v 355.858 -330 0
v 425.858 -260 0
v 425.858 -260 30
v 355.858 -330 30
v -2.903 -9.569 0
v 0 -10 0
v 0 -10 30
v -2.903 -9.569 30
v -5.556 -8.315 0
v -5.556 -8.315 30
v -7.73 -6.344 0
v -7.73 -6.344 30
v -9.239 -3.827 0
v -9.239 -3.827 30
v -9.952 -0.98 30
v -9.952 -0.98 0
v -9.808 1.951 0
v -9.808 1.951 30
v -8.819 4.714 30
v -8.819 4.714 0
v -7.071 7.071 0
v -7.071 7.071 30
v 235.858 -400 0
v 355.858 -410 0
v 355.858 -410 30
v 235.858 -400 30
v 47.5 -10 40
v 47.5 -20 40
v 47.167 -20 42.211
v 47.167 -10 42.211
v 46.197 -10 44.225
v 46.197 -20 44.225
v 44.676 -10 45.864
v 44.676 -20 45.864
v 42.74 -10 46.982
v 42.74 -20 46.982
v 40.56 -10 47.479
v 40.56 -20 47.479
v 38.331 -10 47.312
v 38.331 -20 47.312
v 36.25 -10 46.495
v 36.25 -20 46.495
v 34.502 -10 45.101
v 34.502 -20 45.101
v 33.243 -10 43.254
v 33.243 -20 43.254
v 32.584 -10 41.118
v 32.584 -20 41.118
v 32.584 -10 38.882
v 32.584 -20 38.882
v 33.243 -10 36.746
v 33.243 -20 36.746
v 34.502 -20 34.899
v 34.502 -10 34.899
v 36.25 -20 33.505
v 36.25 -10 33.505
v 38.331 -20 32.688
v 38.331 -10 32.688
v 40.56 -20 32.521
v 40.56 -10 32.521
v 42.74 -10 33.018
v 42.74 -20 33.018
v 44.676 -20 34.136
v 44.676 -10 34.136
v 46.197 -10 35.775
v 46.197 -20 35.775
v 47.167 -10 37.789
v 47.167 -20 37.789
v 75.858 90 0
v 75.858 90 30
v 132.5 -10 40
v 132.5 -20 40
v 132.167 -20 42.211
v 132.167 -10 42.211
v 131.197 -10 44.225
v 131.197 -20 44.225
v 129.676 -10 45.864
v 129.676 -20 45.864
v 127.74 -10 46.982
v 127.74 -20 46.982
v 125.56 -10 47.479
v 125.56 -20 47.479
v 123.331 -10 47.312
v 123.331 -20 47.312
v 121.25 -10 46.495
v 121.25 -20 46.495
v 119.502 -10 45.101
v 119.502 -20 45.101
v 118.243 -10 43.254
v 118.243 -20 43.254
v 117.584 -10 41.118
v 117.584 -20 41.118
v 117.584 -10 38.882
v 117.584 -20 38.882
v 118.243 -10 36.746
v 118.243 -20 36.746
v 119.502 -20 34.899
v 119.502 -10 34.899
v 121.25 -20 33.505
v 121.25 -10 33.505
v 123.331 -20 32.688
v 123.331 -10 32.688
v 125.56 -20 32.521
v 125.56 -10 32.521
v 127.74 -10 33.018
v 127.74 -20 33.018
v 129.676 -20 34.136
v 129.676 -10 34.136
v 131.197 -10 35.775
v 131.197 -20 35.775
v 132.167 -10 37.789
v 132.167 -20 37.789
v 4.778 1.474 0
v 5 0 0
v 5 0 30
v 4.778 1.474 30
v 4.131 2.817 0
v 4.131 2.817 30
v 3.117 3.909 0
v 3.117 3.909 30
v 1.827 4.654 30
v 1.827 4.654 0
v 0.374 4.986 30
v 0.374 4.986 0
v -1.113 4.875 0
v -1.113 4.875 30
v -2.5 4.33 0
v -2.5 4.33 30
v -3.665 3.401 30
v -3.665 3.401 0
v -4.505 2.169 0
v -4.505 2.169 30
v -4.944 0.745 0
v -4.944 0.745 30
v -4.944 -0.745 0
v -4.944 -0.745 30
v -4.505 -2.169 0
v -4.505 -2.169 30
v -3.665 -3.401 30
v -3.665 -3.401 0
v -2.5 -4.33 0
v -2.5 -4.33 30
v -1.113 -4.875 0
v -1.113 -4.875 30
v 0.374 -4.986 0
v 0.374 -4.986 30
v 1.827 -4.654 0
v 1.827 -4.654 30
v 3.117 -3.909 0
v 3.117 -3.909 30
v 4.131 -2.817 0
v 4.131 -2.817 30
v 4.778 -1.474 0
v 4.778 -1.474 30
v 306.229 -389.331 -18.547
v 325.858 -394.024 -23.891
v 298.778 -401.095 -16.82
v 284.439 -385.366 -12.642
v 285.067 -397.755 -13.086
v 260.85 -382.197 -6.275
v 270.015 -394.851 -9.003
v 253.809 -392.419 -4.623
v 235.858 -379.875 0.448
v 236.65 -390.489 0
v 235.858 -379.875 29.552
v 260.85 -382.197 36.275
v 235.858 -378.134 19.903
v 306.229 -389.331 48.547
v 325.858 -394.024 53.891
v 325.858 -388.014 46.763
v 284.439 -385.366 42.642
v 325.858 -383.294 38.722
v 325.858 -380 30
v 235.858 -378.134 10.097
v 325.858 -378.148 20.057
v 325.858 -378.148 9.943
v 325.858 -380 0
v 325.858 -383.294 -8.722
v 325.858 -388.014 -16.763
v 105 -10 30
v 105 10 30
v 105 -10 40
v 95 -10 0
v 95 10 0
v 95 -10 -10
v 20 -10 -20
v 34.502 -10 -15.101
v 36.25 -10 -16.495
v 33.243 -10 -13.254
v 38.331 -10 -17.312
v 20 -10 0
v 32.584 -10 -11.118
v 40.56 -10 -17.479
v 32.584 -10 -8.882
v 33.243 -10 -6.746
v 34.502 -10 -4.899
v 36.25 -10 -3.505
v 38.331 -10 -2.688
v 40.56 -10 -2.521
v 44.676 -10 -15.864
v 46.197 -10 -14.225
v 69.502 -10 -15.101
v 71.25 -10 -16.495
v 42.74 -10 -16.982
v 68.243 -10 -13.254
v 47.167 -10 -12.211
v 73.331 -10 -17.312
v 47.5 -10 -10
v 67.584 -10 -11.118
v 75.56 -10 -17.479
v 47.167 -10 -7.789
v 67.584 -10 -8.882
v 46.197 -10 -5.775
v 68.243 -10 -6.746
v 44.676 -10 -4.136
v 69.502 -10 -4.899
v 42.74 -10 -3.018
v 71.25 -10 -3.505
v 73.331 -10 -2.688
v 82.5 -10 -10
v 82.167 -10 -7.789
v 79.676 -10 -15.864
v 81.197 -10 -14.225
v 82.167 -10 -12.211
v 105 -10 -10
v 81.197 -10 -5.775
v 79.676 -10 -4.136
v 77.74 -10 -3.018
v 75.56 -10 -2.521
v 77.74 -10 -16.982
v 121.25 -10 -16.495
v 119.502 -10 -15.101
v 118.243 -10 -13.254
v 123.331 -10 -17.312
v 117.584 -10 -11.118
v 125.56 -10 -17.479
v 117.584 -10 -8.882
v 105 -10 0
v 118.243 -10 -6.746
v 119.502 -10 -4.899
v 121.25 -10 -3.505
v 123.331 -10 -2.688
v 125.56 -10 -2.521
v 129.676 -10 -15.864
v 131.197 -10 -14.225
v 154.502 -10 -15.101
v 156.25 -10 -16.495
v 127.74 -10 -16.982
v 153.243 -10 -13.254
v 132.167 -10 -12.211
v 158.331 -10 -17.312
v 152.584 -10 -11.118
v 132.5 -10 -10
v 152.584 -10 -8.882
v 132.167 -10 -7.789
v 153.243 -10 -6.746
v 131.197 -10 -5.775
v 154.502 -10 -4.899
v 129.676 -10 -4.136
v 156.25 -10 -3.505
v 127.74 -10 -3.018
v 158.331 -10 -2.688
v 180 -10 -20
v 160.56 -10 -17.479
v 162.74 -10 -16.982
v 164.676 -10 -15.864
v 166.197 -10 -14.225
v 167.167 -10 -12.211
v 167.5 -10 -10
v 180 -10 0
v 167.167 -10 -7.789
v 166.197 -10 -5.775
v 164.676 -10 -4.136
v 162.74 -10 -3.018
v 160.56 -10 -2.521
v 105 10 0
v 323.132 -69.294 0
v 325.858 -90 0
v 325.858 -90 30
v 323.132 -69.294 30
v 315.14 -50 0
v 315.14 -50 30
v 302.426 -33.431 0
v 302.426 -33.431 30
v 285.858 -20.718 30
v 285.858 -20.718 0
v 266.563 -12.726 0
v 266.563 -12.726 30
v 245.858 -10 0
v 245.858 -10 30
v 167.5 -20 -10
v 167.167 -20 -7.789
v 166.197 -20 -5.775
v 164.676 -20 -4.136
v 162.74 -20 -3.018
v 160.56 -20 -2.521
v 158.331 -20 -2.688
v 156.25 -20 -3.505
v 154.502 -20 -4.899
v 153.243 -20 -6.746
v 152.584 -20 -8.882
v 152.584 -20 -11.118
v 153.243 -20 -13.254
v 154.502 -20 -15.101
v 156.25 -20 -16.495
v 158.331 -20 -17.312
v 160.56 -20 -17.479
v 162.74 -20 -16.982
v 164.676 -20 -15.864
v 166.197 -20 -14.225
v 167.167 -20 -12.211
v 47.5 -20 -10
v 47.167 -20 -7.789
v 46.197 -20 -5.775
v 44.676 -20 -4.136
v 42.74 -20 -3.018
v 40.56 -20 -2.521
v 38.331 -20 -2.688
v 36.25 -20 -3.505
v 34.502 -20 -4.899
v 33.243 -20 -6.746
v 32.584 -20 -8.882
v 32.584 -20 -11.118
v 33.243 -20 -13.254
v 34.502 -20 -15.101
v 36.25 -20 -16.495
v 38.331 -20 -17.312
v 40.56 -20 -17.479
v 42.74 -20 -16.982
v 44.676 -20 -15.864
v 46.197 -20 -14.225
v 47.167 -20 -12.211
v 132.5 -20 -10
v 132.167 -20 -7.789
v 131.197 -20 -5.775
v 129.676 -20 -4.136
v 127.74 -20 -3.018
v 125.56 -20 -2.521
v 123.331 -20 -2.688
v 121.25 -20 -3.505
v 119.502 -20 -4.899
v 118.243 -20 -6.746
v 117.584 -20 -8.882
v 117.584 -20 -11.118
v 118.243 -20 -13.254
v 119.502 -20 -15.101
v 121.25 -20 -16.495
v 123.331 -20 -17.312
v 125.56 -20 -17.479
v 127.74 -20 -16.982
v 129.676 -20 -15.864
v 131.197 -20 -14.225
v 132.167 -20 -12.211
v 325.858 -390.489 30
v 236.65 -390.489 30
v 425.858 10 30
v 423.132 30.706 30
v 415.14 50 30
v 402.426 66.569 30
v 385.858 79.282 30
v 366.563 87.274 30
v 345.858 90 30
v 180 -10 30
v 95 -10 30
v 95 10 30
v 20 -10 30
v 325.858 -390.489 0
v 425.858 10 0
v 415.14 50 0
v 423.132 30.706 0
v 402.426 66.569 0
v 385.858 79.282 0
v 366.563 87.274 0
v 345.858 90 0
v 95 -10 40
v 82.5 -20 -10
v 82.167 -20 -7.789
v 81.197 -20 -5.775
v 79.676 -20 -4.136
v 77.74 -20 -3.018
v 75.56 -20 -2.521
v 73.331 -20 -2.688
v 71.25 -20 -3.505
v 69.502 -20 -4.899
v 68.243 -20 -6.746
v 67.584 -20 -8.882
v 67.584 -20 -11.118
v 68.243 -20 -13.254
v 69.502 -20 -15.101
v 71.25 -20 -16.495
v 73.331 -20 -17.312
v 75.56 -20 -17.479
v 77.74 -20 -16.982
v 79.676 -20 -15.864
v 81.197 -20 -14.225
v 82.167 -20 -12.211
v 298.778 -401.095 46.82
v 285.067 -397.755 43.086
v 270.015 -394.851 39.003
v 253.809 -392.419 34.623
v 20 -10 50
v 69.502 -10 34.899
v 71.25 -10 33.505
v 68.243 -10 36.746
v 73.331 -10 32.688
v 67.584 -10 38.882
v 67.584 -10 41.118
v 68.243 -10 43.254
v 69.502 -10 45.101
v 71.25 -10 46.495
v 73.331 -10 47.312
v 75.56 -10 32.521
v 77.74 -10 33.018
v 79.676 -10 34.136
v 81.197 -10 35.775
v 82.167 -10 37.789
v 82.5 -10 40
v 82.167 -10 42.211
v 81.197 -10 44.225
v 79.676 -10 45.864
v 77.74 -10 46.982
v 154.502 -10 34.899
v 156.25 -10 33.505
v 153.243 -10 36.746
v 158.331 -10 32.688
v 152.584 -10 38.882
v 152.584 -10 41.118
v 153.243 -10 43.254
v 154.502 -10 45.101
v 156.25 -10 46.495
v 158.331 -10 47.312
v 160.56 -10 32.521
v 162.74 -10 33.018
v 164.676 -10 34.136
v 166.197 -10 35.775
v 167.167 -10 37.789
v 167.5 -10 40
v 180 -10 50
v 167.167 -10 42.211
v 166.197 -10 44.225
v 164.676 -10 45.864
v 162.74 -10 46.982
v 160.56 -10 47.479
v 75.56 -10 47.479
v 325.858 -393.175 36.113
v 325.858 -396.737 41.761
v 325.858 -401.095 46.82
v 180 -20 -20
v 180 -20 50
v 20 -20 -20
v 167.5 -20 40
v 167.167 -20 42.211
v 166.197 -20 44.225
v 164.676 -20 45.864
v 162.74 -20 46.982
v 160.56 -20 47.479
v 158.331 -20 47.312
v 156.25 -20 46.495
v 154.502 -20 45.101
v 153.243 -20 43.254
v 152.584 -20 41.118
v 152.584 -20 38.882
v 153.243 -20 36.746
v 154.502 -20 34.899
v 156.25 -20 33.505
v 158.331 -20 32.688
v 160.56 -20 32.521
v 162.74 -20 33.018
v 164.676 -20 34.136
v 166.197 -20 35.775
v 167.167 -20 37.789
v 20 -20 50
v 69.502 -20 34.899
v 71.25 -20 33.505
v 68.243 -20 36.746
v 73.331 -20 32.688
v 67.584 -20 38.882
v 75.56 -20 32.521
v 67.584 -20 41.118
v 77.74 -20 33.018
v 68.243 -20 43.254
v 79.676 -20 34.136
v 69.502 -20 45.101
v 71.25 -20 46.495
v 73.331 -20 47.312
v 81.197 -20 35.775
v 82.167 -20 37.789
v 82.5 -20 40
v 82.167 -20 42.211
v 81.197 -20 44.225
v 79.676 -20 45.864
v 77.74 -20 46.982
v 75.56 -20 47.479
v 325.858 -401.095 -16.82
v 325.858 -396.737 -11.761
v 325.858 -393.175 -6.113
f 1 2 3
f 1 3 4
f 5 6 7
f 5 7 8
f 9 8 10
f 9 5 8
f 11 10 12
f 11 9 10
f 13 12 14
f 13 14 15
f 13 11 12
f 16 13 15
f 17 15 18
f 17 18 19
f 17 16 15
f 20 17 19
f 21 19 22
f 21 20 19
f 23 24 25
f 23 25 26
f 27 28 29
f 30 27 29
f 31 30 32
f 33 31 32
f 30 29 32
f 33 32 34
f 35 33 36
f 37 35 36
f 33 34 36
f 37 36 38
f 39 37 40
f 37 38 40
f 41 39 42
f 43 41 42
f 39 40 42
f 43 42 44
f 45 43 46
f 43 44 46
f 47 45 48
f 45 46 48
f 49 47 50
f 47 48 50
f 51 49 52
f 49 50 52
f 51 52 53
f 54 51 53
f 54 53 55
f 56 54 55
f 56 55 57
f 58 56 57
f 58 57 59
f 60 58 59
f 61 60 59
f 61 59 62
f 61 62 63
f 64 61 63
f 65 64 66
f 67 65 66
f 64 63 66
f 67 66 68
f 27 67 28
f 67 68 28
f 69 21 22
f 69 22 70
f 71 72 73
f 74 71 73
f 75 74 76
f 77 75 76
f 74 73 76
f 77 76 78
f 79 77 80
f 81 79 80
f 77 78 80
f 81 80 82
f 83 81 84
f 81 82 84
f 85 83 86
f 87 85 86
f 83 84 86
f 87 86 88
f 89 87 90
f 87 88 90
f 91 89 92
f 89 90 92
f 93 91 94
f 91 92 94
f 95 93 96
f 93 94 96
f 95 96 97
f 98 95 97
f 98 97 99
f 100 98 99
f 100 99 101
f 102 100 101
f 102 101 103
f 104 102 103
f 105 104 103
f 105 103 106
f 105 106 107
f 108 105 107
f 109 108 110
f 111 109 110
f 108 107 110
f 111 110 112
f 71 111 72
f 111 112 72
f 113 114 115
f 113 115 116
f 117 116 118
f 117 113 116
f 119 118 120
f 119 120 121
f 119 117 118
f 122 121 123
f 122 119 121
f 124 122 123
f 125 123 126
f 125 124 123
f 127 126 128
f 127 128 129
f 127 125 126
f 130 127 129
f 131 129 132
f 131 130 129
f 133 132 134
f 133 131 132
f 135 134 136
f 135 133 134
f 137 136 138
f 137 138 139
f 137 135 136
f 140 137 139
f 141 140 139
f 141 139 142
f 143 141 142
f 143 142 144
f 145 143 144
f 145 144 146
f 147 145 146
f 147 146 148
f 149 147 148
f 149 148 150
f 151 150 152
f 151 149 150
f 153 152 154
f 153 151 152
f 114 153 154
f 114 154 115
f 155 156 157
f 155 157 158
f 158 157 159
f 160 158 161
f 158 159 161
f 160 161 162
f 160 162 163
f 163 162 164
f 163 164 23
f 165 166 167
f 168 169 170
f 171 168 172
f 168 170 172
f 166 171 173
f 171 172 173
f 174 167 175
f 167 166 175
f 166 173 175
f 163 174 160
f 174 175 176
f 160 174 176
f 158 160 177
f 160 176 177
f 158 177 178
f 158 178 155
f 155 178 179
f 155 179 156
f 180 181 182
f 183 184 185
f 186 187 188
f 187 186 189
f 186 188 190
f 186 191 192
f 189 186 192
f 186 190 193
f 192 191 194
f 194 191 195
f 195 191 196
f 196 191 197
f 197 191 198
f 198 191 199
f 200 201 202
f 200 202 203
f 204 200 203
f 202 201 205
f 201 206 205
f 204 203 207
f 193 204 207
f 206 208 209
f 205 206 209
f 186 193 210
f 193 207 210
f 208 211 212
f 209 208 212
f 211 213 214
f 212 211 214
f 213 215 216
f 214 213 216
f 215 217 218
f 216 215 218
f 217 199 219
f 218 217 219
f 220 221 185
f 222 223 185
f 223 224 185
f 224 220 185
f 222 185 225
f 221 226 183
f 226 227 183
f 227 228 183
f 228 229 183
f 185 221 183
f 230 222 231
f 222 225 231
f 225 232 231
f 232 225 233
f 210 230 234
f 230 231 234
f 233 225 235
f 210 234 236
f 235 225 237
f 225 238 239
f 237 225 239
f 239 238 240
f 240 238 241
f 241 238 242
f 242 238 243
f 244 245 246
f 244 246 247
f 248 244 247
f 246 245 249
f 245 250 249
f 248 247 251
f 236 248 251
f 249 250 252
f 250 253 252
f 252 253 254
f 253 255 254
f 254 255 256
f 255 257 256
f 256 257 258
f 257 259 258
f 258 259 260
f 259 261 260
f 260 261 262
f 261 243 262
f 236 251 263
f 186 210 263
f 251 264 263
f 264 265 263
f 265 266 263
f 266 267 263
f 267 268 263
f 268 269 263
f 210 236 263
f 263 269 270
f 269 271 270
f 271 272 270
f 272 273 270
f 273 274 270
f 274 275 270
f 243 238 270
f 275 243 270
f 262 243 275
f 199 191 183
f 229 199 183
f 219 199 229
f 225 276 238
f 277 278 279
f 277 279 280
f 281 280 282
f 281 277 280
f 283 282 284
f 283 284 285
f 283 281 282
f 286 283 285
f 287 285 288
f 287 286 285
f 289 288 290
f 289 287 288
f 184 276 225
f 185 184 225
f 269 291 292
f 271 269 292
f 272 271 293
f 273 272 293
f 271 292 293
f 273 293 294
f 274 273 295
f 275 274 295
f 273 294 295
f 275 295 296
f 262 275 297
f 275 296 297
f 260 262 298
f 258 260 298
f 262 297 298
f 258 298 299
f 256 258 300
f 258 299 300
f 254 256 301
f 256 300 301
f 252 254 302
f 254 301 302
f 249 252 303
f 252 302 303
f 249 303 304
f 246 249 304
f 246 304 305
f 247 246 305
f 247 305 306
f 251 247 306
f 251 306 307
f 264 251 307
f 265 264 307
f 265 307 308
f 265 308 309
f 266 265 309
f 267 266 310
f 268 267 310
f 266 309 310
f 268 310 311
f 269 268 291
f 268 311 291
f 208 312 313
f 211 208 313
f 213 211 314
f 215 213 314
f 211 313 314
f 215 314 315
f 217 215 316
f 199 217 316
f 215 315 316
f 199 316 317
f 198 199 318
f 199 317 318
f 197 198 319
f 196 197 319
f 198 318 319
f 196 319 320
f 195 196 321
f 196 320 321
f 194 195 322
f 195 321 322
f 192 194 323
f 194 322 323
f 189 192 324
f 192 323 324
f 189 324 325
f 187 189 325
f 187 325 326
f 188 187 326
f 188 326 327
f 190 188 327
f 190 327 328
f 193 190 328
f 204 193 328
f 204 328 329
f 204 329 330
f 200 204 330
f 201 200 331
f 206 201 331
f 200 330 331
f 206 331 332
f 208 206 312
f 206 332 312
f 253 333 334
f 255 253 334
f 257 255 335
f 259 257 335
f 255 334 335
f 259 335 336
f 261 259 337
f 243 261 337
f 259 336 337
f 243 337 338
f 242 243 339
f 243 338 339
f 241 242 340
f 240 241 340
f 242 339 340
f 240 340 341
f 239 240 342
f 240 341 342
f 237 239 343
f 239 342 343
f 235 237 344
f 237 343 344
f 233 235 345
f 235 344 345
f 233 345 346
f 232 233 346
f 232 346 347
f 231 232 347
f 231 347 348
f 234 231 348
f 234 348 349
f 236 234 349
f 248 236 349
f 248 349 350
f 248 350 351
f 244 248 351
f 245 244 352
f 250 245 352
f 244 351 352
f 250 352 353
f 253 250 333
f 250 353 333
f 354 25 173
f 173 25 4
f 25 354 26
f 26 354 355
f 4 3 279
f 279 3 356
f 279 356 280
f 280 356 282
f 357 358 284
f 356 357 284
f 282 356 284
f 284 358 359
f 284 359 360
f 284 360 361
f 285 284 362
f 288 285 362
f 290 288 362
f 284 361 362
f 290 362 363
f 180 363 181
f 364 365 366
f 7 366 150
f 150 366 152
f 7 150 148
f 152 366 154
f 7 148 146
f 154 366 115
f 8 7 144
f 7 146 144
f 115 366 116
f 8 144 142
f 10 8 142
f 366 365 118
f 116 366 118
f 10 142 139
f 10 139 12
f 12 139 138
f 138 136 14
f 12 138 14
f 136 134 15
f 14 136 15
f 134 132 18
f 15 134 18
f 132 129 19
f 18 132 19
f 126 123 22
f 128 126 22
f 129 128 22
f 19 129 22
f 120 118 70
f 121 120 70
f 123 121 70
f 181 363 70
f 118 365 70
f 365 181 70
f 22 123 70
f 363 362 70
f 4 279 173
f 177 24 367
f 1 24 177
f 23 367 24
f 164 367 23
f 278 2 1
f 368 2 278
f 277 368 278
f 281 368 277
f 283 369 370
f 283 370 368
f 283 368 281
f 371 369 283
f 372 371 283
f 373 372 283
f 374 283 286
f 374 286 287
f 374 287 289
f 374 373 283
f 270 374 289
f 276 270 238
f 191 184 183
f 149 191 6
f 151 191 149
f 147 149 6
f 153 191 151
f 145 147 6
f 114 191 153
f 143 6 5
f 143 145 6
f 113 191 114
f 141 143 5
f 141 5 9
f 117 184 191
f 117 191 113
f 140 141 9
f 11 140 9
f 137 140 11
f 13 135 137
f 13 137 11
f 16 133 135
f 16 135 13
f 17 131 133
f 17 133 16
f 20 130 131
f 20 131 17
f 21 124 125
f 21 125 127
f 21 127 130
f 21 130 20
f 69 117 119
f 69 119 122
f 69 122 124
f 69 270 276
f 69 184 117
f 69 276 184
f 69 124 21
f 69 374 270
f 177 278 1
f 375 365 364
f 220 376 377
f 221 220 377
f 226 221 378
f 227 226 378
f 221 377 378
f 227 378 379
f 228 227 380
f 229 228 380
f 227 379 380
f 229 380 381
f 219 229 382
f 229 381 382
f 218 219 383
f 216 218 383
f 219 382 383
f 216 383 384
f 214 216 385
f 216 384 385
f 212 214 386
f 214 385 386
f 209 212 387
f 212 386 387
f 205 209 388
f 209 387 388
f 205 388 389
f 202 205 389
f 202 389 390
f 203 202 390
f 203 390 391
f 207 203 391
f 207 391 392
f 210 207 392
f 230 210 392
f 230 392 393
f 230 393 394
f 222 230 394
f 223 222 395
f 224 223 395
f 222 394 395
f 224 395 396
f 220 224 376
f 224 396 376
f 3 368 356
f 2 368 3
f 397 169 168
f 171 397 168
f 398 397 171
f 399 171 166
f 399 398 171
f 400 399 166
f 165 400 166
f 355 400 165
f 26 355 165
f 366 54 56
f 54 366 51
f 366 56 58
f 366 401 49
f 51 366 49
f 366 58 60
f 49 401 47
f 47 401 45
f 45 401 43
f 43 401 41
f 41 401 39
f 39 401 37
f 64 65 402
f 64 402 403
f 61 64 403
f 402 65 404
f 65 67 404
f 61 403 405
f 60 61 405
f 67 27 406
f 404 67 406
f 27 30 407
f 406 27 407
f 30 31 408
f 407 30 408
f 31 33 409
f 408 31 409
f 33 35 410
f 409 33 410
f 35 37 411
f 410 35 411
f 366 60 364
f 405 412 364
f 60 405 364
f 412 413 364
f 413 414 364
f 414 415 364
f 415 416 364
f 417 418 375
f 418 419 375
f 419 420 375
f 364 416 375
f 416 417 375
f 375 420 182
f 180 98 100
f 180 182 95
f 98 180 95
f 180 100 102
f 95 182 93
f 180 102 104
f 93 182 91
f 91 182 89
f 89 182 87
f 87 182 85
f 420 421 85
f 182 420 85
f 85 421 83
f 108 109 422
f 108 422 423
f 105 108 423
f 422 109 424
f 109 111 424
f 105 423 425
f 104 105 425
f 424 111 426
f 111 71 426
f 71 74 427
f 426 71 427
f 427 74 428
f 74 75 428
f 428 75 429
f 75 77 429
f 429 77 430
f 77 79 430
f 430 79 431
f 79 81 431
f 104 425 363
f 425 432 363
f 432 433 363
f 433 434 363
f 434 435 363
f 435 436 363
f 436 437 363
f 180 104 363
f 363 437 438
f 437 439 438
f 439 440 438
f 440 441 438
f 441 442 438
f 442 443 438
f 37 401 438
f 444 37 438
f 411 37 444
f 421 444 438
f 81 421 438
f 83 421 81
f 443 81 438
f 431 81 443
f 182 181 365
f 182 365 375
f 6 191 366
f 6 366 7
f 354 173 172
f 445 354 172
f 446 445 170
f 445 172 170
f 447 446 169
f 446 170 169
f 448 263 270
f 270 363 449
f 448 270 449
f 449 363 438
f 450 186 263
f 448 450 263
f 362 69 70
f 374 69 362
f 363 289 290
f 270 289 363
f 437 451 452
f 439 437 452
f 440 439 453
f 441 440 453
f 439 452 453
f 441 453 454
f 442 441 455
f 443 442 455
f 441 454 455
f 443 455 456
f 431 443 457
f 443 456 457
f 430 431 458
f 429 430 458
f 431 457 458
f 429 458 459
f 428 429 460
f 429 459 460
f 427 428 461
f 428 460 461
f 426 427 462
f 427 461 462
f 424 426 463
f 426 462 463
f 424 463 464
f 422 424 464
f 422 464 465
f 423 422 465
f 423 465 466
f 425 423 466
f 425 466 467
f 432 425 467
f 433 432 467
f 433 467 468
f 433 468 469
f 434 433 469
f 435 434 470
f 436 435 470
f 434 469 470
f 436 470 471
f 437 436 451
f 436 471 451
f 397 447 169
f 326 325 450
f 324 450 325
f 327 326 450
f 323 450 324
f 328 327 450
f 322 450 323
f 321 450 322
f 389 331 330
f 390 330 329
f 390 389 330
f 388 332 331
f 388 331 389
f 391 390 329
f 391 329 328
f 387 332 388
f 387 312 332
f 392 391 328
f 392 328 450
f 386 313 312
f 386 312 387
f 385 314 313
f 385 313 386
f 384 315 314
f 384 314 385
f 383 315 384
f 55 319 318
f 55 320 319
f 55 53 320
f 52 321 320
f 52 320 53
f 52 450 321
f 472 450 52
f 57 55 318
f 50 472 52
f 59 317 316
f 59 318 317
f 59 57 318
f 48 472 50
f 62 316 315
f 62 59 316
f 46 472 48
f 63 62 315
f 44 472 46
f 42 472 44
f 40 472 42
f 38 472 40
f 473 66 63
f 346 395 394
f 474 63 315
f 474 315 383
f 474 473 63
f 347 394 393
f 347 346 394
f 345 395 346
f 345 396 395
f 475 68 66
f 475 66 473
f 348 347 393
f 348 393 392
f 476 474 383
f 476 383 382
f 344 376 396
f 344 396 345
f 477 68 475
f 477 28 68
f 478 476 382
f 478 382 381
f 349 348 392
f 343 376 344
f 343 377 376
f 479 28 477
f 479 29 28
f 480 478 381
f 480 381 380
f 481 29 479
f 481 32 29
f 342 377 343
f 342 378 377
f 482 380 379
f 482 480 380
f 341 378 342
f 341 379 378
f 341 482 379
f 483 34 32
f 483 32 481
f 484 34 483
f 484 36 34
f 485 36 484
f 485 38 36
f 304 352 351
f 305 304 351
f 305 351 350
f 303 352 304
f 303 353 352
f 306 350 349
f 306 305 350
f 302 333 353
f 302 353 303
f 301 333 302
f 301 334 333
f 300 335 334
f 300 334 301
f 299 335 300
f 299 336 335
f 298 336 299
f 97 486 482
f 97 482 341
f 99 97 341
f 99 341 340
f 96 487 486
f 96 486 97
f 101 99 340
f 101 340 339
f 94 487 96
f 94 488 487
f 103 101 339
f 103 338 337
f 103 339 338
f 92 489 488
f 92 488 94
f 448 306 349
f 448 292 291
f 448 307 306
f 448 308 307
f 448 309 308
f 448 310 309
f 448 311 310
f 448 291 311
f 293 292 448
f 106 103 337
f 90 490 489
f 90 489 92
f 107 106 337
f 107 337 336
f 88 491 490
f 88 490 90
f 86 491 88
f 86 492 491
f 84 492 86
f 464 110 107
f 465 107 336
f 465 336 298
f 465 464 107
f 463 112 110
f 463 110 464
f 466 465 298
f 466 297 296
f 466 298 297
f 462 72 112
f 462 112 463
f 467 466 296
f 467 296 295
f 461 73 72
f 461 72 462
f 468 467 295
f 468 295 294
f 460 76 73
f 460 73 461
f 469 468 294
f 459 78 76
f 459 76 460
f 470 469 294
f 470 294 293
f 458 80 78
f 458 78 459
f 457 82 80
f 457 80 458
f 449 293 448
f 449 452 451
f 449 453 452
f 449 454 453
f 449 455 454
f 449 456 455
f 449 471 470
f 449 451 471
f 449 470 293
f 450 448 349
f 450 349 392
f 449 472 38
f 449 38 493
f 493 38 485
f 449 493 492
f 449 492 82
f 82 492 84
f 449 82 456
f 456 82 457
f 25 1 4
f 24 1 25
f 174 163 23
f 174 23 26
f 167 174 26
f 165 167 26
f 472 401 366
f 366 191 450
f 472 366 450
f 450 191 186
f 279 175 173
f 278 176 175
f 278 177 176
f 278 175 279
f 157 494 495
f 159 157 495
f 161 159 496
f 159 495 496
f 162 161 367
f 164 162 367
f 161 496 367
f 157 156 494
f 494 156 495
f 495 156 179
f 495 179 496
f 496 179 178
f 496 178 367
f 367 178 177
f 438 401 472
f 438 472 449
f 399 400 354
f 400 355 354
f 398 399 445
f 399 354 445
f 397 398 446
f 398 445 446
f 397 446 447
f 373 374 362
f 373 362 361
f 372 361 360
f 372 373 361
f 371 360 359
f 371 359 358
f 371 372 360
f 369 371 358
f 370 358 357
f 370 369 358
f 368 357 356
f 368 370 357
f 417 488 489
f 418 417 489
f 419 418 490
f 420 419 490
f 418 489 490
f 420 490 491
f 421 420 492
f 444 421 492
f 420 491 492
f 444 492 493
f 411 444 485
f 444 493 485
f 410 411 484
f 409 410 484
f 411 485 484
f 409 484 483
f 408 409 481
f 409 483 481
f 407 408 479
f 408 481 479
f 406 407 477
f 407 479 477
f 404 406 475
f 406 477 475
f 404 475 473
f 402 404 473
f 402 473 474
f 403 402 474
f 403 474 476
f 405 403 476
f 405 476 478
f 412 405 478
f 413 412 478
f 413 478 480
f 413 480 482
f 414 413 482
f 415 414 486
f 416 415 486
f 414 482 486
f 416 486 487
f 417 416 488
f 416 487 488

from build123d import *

# Parameters (mm, degrees)
SKETCH1_R           = 5
BOSS_EXTRUDE1_DEPTH = 30
SKETCH2_W           = 160
SKETCH2_H           = 20
SKETCH2_H_2         = 30
BOSS_EXTRUDE2_DEPTH = 10
RIB1_REACH          = 528.102
SKETCH5_WALL_W      = 1076.564743208
SKETCH5_WALL_H      = 10
RIB17_REACH         = 528.102
SKETCH7_WALL_W      = 1076.564743208
SKETCH7_WALL_H      = 10
SKETCH8_R           = 7.5
CUT_EXTRUDE1_DEPTH  = 10
BOSS_EXTRUDE3_DEPTH = 90
CUT_EXTRUDE3_DEPTH  = 30


with BuildPart() as part:
    # Sketch1 → Boss-Extrude1 (new body)
    with BuildSketch(Plane.XY):
        with BuildLine():
            Line((-7.071067812, 7.071067812), (75.857864376, 90))
            Line((75.857864376, 90), (345.857864376, 90))
            ThreePointArc((345.857864376, 90), (402.426406871, 66.568542495), (425.857864376, 10))
            Line((425.857864376, 10), (425.857864376, -260))
            Line((425.857864376, -260), (355.857864376, -330))
            Line((355.857864376, -330), (355.857864376, -410))
            Line((355.857864376, -410), (235.857864376, -400))
            Line((235.857864376, -400), (235.857864376, -380))
            Line((235.857864376, -380), (325.857864376, -380))
            Line((325.857864376, -380), (325.857864376, -90))
            ThreePointArc((325.857864376, -90), (302.426406871, -33.431457505), (245.857864376, -10))
            Line((245.857864376, -10), (0, -10))
            ThreePointArc((0, -10), (-9.238795325, -3.826834324), (-7.071067812, 7.071067812))
        make_face()
        Circle(SKETCH1_R, mode=Mode.SUBTRACT)
    extrude(amount=BOSS_EXTRUDE1_DEPTH)

    # Sketch2 → Boss-Extrude2 (add)
    with BuildSketch(Plane.XZ.offset(10)):
        with Locations((100, 40)):
            Rectangle(SKETCH2_W, SKETCH2_H)
        with Locations((100, 15)):
            Rectangle(SKETCH2_W, SKETCH2_H_2)
        with Locations((100, -10)):
            Rectangle(SKETCH2_W, SKETCH2_H)
    extrude(amount=BOSS_EXTRUDE2_DEPTH)

    # Sketch5 wall → Rib1 (add, up to next)
    with BuildSketch(Plane(origin=(100, 0, 35), x_dir=(0, -0.894427191, 0.4472135955), z_dir=(0, 0.4472135955, 0.894427191)), mode=Mode.PRIVATE) as rib1_sk1:
        Rectangle(SKETCH5_WALL_W, SKETCH5_WALL_H)
    rib1_tool1 = extrude(rib1_sk1.sketch, amount=-RIB1_REACH, mode=Mode.PRIVATE) - part.part
    add(rib1_tool1.solids().sort_by_distance((100, 0, 35))[0])

    # Sketch7 wall → Rib17 (add, up to next)
    with BuildSketch(Plane(origin=(100, 0, -5), x_dir=(0, -0.894427191, -0.4472135955), z_dir=(0, -0.4472135955, 0.894427191)), mode=Mode.PRIVATE) as rib17_sk1:
        Rectangle(SKETCH7_WALL_W, SKETCH7_WALL_H)
    rib17_tool1 = extrude(rib17_sk1.sketch, amount=RIB17_REACH, mode=Mode.PRIVATE) - part.part
    add(rib17_tool1.solids().sort_by_distance((100, 0, -5))[0])

    # Sketch8 → Cut-Extrude1 (cut)
    with BuildSketch(Plane.XZ.offset(20)):
        with Locations((40, 40)):
            Circle(SKETCH8_R)
        with Locations((75, 40)):
            Circle(SKETCH8_R)
        with Locations((40, -10)):
            Circle(SKETCH8_R)
        with Locations((75, -10)):
            Circle(SKETCH8_R)
        with Locations((125, -10)):
            Circle(SKETCH8_R)
        with Locations((160, -10)):
            Circle(SKETCH8_R)
        with Locations((160, 40)):
            Circle(SKETCH8_R)
        with Locations((125, 40)):
            Circle(SKETCH8_R)
    extrude(amount=-CUT_EXTRUDE1_DEPTH, mode=Mode.SUBTRACT)

    # Sketch9 → Boss-Extrude3 (add)
    with BuildSketch(Plane.ZY.offset(-325.857864376)):
        with BuildLine():
            Line((-23.890872965, -394.024153256), (-16.819805153, -401.095221068))
            ThreePointArc((-16.819805153, -401.095221068), (15, -387.915026221), (46.819805153, -401.095221068))
            Line((46.819805153, -401.095221068), (53.890872965, -394.024153256))
            ThreePointArc((53.890872965, -394.024153256), (15, -377.915026221), (-23.890872965, -394.024153256))
        make_face()
    extrude(amount=BOSS_EXTRUDE3_DEPTH)

    # Sketch10 → Cut-Extrude3 (cut)
    with BuildSketch(Plane(origin=(-31.476842315, -377.722107776, 0), x_dir=(0.9965457582448797, -0.08304547985374007, 0), z_dir=(-0.08304547985374007, -0.9965457582448797, 0))):
        Polygon((374.546486812, 58.469151485), (256.226012344, 26.776259204), (256.226012344, 62.056204403), align=None)
        Polygon((374.082224106, -28.344795763), (258.075215741, 2.728419895), (258.075215741, -32.721264486), align=None)
    extrude(amount=-CUT_EXTRUDE3_DEPTH, mode=Mode.SUBTRACT)


with BuildPart() as body_2:
    # of the pieces the cut leaves, the one that is kept (cut_extrude3_keep)
    add(part.part.solids().sort_by_distance((245.857864376, -10, 0))[0])


solid = body_2.part
